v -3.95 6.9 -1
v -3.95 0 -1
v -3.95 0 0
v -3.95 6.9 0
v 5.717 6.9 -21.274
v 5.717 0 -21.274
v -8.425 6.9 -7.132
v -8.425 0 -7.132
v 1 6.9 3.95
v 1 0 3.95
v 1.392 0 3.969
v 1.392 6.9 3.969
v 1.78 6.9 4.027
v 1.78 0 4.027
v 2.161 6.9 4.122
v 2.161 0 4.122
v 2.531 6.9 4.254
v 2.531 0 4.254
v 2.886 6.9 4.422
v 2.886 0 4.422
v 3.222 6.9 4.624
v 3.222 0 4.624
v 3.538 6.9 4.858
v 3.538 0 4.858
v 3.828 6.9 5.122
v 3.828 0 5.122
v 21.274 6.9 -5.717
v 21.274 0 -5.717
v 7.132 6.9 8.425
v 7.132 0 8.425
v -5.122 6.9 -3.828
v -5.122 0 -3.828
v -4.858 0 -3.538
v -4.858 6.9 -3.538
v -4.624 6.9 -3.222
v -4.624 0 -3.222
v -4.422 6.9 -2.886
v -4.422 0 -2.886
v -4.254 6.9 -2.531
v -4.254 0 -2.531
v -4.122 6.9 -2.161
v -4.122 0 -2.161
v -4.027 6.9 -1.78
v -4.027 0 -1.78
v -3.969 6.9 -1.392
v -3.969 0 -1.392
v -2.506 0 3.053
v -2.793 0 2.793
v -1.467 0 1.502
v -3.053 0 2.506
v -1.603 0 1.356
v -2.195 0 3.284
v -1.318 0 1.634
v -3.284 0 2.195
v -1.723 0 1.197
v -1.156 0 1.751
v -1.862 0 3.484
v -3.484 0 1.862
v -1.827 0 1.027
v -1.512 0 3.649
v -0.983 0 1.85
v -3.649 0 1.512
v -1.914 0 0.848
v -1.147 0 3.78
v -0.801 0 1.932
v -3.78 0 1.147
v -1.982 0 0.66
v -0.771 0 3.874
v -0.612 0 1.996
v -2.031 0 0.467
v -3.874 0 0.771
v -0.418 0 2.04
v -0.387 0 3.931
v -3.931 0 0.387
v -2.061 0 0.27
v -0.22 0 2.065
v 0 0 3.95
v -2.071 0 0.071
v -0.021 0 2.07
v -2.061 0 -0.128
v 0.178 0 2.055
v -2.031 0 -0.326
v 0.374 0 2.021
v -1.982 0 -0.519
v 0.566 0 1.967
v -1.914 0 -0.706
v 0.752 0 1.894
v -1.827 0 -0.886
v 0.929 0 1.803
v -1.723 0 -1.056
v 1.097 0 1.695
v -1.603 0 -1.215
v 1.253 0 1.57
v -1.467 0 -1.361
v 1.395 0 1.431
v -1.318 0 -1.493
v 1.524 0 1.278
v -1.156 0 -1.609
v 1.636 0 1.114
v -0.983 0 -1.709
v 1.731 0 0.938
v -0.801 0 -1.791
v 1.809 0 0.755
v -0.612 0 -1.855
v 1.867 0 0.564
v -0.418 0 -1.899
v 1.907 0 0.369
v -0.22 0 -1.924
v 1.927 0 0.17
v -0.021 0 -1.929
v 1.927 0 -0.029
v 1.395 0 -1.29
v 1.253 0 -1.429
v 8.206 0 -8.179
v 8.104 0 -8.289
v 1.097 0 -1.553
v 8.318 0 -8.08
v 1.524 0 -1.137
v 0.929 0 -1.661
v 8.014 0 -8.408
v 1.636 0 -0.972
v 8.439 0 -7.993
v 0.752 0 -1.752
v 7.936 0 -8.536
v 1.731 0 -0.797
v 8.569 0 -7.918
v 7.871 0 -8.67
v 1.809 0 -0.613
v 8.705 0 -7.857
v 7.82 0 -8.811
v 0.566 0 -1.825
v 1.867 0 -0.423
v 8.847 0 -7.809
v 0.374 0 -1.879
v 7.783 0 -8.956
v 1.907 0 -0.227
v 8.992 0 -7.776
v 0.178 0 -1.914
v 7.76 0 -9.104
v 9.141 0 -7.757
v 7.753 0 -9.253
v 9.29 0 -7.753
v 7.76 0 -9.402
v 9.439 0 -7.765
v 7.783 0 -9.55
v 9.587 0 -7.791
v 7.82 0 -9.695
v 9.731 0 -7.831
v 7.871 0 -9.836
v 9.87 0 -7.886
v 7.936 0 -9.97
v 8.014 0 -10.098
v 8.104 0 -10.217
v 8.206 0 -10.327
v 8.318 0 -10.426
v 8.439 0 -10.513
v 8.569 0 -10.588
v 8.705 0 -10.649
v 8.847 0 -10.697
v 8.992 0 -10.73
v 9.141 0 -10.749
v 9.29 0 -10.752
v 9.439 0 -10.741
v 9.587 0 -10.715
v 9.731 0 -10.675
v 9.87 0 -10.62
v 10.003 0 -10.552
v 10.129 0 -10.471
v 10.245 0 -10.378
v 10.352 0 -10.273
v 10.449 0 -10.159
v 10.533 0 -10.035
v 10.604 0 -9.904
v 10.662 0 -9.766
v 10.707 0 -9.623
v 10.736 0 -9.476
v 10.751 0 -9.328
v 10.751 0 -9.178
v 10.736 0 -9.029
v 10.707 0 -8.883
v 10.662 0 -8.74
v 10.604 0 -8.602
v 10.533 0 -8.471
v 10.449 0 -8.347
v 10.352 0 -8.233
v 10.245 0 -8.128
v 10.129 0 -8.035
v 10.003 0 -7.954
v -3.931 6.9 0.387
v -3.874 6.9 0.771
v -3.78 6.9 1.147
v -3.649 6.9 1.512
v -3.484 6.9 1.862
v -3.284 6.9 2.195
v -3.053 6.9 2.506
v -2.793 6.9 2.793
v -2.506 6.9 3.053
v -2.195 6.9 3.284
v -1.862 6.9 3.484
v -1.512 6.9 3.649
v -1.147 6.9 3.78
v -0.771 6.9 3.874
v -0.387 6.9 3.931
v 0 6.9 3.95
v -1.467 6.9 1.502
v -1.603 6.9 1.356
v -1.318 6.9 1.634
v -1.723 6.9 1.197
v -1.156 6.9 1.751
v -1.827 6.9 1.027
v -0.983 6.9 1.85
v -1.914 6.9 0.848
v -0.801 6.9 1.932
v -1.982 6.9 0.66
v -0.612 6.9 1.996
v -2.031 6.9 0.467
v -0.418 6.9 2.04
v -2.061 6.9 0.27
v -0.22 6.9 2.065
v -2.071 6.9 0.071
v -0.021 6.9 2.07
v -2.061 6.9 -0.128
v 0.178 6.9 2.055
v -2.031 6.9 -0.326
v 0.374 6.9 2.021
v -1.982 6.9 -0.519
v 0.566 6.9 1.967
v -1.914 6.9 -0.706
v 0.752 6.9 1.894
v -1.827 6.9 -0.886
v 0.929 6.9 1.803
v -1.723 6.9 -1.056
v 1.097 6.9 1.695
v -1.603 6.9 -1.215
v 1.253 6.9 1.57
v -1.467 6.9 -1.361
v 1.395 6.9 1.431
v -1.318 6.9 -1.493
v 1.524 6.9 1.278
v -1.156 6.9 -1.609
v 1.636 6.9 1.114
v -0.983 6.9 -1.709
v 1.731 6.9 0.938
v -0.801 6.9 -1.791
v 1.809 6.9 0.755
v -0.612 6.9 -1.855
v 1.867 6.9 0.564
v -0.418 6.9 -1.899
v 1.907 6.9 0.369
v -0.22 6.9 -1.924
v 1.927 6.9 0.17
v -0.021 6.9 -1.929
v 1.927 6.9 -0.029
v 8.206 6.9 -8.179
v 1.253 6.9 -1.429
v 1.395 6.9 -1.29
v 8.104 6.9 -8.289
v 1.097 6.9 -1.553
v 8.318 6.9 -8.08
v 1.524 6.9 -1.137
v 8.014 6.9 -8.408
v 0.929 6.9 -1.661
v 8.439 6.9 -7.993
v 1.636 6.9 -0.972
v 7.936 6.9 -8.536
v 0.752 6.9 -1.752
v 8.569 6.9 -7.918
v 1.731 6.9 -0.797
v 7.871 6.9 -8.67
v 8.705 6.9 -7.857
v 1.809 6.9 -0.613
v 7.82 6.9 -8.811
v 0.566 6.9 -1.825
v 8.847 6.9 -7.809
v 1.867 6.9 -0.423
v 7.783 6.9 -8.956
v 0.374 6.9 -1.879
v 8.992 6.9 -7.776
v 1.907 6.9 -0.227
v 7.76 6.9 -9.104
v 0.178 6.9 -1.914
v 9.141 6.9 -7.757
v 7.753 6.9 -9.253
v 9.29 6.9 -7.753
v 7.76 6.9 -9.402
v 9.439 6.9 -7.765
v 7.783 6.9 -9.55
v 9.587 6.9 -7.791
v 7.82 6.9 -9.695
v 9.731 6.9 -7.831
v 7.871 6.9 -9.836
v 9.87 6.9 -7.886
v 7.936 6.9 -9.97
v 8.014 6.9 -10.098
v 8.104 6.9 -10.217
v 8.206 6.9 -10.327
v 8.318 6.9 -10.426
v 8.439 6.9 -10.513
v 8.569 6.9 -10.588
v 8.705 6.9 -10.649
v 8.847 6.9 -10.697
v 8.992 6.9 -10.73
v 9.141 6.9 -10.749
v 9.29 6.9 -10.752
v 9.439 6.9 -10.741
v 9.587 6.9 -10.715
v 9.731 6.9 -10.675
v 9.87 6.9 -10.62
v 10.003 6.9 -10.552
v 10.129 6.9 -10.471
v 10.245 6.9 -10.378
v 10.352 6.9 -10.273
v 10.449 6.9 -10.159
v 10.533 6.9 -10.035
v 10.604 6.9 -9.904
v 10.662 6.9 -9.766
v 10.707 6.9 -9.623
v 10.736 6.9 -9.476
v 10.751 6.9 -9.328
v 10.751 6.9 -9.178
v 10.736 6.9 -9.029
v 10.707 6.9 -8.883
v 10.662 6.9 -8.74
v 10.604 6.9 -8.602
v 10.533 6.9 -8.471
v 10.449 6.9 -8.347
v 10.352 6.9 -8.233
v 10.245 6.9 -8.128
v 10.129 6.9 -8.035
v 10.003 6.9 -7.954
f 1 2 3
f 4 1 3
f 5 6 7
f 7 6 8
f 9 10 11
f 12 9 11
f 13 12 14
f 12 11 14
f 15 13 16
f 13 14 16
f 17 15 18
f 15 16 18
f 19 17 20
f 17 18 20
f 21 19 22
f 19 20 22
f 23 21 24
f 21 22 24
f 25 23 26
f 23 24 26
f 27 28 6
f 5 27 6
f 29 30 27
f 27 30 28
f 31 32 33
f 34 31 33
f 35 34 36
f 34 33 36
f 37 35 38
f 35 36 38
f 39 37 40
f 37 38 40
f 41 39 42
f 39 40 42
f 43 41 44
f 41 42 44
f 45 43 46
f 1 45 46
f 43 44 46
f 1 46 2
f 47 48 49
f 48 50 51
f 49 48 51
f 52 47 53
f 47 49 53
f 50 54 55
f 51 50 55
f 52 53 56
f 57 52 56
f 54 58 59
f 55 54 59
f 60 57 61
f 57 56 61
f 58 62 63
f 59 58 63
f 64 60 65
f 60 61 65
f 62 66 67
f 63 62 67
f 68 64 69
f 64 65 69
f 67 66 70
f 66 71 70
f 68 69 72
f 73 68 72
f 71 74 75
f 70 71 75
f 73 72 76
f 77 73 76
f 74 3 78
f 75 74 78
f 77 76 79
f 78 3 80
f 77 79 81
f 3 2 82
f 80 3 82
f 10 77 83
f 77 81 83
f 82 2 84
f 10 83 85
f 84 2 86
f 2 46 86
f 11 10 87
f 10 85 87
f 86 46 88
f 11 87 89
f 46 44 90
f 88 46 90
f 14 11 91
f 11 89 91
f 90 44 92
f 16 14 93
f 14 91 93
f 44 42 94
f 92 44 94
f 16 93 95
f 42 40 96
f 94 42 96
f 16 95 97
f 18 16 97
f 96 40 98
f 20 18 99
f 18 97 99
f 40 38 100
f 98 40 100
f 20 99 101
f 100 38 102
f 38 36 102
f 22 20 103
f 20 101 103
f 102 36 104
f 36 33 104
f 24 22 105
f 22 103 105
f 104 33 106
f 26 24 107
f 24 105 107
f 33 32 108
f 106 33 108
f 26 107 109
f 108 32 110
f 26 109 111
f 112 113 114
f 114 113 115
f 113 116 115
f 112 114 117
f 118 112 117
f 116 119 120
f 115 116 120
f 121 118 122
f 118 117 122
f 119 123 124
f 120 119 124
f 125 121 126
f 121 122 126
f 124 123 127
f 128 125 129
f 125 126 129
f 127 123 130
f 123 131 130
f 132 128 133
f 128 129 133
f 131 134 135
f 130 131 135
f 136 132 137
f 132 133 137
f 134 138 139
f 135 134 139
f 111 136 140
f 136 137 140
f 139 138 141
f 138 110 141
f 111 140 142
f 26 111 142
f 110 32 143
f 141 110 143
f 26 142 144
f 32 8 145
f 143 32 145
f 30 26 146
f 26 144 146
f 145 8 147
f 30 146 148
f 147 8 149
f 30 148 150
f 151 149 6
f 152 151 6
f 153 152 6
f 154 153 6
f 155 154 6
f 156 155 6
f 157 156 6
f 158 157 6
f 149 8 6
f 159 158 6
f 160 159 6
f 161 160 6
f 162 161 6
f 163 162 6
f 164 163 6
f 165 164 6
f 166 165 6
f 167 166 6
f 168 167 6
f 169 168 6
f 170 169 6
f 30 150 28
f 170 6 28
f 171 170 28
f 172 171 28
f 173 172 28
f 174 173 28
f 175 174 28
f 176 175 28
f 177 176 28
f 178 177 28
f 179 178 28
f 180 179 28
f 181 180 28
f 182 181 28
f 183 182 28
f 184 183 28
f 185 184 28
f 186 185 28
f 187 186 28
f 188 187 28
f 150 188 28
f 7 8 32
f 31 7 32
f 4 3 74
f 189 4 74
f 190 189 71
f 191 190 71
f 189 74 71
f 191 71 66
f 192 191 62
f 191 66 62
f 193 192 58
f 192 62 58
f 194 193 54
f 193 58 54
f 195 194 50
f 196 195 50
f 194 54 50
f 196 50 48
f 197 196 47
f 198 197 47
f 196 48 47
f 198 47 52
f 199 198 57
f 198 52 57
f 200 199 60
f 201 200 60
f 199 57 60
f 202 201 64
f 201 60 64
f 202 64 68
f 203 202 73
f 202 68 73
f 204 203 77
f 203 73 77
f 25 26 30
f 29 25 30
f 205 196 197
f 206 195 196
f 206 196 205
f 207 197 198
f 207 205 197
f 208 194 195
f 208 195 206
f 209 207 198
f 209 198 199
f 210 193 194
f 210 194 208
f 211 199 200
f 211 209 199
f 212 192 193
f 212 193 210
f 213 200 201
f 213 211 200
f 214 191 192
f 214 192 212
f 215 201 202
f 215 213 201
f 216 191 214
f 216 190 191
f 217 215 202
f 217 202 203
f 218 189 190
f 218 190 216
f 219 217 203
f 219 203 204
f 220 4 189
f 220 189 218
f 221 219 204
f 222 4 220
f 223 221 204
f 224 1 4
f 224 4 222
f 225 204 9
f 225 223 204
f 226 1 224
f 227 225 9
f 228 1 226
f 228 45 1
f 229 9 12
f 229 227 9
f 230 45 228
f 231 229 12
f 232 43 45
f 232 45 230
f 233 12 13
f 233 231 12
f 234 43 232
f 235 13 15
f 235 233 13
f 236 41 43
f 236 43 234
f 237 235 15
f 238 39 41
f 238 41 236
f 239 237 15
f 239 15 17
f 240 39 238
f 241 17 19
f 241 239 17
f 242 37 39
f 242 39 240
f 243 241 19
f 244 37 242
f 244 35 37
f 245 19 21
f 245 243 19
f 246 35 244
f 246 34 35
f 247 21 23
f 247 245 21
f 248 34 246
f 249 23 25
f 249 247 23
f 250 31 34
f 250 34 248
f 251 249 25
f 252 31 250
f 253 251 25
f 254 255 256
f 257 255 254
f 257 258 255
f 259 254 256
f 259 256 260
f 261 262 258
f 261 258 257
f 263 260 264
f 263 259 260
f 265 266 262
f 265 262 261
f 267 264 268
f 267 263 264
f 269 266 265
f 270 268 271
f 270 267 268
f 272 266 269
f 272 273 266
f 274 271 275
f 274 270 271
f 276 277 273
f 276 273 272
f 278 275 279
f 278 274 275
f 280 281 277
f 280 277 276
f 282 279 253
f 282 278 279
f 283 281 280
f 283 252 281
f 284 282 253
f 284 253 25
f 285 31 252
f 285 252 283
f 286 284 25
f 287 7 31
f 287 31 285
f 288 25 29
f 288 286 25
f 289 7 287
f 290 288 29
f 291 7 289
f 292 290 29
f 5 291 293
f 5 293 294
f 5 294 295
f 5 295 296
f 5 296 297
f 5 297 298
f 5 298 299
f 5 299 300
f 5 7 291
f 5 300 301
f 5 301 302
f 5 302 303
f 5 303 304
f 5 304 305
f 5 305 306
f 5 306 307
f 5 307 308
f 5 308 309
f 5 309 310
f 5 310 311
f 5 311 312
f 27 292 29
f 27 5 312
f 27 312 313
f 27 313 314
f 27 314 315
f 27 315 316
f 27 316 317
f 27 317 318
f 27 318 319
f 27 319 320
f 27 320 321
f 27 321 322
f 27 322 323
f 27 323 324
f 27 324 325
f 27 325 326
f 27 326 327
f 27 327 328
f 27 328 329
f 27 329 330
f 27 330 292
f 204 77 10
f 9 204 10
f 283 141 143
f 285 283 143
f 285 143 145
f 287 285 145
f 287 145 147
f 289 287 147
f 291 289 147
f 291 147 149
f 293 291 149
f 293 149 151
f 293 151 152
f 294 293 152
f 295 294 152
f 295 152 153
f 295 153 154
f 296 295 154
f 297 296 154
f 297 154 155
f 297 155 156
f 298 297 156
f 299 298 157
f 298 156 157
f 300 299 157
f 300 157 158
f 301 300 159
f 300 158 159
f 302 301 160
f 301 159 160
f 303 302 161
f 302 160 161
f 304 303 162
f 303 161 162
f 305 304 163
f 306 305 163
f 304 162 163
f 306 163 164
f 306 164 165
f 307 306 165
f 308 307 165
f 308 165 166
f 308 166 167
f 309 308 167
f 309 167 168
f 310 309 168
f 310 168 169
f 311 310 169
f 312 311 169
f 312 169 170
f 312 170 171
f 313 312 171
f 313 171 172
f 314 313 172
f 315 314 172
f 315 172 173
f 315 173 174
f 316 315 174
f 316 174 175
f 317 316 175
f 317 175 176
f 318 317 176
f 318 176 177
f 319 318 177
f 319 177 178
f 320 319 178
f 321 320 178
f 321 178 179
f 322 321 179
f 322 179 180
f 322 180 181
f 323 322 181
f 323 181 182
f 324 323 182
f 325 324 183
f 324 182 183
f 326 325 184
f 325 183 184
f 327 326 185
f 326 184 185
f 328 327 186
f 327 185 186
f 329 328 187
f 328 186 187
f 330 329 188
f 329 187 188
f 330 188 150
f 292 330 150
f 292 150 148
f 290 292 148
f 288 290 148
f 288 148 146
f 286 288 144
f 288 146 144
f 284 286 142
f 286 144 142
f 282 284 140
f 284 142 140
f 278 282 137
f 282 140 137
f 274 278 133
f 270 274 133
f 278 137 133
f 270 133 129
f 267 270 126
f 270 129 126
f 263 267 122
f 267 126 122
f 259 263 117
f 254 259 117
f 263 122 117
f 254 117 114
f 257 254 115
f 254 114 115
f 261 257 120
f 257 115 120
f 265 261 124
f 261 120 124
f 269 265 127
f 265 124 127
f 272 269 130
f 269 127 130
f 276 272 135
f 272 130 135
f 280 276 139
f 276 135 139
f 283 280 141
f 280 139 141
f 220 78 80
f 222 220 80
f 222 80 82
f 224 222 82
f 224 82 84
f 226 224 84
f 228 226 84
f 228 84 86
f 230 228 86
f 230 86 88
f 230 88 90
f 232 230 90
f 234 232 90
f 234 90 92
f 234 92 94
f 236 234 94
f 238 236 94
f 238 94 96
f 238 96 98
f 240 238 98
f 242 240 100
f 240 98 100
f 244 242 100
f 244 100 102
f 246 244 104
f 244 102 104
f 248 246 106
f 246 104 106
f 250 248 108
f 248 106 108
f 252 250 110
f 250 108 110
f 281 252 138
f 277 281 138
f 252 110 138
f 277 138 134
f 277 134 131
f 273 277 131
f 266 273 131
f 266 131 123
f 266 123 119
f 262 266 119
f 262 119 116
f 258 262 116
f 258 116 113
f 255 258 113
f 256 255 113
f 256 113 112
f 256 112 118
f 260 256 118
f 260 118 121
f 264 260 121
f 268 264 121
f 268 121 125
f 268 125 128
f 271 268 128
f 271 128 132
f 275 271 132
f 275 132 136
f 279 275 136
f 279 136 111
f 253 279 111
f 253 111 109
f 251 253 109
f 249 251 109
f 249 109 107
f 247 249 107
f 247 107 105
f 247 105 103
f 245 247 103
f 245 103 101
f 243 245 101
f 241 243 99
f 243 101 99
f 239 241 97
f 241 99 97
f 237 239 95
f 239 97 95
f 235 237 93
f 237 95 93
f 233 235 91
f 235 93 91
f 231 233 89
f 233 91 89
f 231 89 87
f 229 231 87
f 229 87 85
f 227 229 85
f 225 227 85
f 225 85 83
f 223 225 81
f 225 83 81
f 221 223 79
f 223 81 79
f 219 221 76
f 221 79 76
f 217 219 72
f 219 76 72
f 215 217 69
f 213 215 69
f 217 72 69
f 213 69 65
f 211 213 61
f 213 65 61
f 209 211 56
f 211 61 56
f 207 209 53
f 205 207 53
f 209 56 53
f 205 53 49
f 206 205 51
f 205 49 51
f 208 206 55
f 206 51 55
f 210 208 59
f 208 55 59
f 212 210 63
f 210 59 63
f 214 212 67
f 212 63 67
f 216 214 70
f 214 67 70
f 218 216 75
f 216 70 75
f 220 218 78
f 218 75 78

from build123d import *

# Parameters (mm, degrees)
AUFSATZ_LINEAR_AUSTRAGEN1_DEPTH = 6.9
F_4_0_4_DURCHMESSER_BOHRUNG1_D  = 4
F_3_0_3_DURCHMESSER_BOHRUNG1_D  = 3


with BuildPart() as part:
    # Skizze1 → Aufsatz-Linear austragen1 (new body)
    with BuildSketch(Plane(origin=(0, 0, 0), x_dir=(1, 0, 0), z_dir=(0, 1, 0))):
        with BuildLine():
            Line((0, -3.95), (1, -3.95))
            ThreePointArc((1, -3.95), (2.530733729, -4.25448187), (3.828427125, -5.121572875))
            Line((3.828427125, -5.121572875), (7.131601718, -8.424747468))
            Line((7.131601718, -8.424747468), (21.273737342, 5.717388155))
            Line((21.273737342, 5.717388155), (5.717388155, 21.273737342))
            Line((5.717388155, 21.273737342), (-8.424747468, 7.131601718))
            Line((-8.424747468, 7.131601718), (-5.121572875, 3.828427125))
            ThreePointArc((-5.121572875, 3.828427125), (-4.25448187, 2.530733729), (-3.95, 1))
            Line((-3.95, 1), (-3.95, 0))
            ThreePointArc((-3.95, 0), (-2.793071786, -2.793071786), (0, -3.95))
        make_face()
    extrude(amount=AUFSATZ_LINEAR_AUSTRAGEN1_DEPTH)

    # Ø4.0 (4) Durchmesser Bohrung1 (through all)
    with Locations(Plane(origin=(0, 6.9, 0), x_dir=(1, 0, 0), z_dir=(0, 1, 0))):
        with Locations((-0.070710678, -0.070710678)):
            Hole(F_4_0_4_DURCHMESSER_BOHRUNG1_D / 2)

    # Ø3.0 (3) Durchmesser Bohrung1 (through all)
    with Locations(Plane(origin=(0, 6.9, 0), x_dir=(1, 0, 0), z_dir=(0, 1, 0))):
        with Locations((9.252922061, 9.252922061)):
            Hole(F_3_0_3_DURCHMESSER_BOHRUNG1_D / 2)


solid = part.part
